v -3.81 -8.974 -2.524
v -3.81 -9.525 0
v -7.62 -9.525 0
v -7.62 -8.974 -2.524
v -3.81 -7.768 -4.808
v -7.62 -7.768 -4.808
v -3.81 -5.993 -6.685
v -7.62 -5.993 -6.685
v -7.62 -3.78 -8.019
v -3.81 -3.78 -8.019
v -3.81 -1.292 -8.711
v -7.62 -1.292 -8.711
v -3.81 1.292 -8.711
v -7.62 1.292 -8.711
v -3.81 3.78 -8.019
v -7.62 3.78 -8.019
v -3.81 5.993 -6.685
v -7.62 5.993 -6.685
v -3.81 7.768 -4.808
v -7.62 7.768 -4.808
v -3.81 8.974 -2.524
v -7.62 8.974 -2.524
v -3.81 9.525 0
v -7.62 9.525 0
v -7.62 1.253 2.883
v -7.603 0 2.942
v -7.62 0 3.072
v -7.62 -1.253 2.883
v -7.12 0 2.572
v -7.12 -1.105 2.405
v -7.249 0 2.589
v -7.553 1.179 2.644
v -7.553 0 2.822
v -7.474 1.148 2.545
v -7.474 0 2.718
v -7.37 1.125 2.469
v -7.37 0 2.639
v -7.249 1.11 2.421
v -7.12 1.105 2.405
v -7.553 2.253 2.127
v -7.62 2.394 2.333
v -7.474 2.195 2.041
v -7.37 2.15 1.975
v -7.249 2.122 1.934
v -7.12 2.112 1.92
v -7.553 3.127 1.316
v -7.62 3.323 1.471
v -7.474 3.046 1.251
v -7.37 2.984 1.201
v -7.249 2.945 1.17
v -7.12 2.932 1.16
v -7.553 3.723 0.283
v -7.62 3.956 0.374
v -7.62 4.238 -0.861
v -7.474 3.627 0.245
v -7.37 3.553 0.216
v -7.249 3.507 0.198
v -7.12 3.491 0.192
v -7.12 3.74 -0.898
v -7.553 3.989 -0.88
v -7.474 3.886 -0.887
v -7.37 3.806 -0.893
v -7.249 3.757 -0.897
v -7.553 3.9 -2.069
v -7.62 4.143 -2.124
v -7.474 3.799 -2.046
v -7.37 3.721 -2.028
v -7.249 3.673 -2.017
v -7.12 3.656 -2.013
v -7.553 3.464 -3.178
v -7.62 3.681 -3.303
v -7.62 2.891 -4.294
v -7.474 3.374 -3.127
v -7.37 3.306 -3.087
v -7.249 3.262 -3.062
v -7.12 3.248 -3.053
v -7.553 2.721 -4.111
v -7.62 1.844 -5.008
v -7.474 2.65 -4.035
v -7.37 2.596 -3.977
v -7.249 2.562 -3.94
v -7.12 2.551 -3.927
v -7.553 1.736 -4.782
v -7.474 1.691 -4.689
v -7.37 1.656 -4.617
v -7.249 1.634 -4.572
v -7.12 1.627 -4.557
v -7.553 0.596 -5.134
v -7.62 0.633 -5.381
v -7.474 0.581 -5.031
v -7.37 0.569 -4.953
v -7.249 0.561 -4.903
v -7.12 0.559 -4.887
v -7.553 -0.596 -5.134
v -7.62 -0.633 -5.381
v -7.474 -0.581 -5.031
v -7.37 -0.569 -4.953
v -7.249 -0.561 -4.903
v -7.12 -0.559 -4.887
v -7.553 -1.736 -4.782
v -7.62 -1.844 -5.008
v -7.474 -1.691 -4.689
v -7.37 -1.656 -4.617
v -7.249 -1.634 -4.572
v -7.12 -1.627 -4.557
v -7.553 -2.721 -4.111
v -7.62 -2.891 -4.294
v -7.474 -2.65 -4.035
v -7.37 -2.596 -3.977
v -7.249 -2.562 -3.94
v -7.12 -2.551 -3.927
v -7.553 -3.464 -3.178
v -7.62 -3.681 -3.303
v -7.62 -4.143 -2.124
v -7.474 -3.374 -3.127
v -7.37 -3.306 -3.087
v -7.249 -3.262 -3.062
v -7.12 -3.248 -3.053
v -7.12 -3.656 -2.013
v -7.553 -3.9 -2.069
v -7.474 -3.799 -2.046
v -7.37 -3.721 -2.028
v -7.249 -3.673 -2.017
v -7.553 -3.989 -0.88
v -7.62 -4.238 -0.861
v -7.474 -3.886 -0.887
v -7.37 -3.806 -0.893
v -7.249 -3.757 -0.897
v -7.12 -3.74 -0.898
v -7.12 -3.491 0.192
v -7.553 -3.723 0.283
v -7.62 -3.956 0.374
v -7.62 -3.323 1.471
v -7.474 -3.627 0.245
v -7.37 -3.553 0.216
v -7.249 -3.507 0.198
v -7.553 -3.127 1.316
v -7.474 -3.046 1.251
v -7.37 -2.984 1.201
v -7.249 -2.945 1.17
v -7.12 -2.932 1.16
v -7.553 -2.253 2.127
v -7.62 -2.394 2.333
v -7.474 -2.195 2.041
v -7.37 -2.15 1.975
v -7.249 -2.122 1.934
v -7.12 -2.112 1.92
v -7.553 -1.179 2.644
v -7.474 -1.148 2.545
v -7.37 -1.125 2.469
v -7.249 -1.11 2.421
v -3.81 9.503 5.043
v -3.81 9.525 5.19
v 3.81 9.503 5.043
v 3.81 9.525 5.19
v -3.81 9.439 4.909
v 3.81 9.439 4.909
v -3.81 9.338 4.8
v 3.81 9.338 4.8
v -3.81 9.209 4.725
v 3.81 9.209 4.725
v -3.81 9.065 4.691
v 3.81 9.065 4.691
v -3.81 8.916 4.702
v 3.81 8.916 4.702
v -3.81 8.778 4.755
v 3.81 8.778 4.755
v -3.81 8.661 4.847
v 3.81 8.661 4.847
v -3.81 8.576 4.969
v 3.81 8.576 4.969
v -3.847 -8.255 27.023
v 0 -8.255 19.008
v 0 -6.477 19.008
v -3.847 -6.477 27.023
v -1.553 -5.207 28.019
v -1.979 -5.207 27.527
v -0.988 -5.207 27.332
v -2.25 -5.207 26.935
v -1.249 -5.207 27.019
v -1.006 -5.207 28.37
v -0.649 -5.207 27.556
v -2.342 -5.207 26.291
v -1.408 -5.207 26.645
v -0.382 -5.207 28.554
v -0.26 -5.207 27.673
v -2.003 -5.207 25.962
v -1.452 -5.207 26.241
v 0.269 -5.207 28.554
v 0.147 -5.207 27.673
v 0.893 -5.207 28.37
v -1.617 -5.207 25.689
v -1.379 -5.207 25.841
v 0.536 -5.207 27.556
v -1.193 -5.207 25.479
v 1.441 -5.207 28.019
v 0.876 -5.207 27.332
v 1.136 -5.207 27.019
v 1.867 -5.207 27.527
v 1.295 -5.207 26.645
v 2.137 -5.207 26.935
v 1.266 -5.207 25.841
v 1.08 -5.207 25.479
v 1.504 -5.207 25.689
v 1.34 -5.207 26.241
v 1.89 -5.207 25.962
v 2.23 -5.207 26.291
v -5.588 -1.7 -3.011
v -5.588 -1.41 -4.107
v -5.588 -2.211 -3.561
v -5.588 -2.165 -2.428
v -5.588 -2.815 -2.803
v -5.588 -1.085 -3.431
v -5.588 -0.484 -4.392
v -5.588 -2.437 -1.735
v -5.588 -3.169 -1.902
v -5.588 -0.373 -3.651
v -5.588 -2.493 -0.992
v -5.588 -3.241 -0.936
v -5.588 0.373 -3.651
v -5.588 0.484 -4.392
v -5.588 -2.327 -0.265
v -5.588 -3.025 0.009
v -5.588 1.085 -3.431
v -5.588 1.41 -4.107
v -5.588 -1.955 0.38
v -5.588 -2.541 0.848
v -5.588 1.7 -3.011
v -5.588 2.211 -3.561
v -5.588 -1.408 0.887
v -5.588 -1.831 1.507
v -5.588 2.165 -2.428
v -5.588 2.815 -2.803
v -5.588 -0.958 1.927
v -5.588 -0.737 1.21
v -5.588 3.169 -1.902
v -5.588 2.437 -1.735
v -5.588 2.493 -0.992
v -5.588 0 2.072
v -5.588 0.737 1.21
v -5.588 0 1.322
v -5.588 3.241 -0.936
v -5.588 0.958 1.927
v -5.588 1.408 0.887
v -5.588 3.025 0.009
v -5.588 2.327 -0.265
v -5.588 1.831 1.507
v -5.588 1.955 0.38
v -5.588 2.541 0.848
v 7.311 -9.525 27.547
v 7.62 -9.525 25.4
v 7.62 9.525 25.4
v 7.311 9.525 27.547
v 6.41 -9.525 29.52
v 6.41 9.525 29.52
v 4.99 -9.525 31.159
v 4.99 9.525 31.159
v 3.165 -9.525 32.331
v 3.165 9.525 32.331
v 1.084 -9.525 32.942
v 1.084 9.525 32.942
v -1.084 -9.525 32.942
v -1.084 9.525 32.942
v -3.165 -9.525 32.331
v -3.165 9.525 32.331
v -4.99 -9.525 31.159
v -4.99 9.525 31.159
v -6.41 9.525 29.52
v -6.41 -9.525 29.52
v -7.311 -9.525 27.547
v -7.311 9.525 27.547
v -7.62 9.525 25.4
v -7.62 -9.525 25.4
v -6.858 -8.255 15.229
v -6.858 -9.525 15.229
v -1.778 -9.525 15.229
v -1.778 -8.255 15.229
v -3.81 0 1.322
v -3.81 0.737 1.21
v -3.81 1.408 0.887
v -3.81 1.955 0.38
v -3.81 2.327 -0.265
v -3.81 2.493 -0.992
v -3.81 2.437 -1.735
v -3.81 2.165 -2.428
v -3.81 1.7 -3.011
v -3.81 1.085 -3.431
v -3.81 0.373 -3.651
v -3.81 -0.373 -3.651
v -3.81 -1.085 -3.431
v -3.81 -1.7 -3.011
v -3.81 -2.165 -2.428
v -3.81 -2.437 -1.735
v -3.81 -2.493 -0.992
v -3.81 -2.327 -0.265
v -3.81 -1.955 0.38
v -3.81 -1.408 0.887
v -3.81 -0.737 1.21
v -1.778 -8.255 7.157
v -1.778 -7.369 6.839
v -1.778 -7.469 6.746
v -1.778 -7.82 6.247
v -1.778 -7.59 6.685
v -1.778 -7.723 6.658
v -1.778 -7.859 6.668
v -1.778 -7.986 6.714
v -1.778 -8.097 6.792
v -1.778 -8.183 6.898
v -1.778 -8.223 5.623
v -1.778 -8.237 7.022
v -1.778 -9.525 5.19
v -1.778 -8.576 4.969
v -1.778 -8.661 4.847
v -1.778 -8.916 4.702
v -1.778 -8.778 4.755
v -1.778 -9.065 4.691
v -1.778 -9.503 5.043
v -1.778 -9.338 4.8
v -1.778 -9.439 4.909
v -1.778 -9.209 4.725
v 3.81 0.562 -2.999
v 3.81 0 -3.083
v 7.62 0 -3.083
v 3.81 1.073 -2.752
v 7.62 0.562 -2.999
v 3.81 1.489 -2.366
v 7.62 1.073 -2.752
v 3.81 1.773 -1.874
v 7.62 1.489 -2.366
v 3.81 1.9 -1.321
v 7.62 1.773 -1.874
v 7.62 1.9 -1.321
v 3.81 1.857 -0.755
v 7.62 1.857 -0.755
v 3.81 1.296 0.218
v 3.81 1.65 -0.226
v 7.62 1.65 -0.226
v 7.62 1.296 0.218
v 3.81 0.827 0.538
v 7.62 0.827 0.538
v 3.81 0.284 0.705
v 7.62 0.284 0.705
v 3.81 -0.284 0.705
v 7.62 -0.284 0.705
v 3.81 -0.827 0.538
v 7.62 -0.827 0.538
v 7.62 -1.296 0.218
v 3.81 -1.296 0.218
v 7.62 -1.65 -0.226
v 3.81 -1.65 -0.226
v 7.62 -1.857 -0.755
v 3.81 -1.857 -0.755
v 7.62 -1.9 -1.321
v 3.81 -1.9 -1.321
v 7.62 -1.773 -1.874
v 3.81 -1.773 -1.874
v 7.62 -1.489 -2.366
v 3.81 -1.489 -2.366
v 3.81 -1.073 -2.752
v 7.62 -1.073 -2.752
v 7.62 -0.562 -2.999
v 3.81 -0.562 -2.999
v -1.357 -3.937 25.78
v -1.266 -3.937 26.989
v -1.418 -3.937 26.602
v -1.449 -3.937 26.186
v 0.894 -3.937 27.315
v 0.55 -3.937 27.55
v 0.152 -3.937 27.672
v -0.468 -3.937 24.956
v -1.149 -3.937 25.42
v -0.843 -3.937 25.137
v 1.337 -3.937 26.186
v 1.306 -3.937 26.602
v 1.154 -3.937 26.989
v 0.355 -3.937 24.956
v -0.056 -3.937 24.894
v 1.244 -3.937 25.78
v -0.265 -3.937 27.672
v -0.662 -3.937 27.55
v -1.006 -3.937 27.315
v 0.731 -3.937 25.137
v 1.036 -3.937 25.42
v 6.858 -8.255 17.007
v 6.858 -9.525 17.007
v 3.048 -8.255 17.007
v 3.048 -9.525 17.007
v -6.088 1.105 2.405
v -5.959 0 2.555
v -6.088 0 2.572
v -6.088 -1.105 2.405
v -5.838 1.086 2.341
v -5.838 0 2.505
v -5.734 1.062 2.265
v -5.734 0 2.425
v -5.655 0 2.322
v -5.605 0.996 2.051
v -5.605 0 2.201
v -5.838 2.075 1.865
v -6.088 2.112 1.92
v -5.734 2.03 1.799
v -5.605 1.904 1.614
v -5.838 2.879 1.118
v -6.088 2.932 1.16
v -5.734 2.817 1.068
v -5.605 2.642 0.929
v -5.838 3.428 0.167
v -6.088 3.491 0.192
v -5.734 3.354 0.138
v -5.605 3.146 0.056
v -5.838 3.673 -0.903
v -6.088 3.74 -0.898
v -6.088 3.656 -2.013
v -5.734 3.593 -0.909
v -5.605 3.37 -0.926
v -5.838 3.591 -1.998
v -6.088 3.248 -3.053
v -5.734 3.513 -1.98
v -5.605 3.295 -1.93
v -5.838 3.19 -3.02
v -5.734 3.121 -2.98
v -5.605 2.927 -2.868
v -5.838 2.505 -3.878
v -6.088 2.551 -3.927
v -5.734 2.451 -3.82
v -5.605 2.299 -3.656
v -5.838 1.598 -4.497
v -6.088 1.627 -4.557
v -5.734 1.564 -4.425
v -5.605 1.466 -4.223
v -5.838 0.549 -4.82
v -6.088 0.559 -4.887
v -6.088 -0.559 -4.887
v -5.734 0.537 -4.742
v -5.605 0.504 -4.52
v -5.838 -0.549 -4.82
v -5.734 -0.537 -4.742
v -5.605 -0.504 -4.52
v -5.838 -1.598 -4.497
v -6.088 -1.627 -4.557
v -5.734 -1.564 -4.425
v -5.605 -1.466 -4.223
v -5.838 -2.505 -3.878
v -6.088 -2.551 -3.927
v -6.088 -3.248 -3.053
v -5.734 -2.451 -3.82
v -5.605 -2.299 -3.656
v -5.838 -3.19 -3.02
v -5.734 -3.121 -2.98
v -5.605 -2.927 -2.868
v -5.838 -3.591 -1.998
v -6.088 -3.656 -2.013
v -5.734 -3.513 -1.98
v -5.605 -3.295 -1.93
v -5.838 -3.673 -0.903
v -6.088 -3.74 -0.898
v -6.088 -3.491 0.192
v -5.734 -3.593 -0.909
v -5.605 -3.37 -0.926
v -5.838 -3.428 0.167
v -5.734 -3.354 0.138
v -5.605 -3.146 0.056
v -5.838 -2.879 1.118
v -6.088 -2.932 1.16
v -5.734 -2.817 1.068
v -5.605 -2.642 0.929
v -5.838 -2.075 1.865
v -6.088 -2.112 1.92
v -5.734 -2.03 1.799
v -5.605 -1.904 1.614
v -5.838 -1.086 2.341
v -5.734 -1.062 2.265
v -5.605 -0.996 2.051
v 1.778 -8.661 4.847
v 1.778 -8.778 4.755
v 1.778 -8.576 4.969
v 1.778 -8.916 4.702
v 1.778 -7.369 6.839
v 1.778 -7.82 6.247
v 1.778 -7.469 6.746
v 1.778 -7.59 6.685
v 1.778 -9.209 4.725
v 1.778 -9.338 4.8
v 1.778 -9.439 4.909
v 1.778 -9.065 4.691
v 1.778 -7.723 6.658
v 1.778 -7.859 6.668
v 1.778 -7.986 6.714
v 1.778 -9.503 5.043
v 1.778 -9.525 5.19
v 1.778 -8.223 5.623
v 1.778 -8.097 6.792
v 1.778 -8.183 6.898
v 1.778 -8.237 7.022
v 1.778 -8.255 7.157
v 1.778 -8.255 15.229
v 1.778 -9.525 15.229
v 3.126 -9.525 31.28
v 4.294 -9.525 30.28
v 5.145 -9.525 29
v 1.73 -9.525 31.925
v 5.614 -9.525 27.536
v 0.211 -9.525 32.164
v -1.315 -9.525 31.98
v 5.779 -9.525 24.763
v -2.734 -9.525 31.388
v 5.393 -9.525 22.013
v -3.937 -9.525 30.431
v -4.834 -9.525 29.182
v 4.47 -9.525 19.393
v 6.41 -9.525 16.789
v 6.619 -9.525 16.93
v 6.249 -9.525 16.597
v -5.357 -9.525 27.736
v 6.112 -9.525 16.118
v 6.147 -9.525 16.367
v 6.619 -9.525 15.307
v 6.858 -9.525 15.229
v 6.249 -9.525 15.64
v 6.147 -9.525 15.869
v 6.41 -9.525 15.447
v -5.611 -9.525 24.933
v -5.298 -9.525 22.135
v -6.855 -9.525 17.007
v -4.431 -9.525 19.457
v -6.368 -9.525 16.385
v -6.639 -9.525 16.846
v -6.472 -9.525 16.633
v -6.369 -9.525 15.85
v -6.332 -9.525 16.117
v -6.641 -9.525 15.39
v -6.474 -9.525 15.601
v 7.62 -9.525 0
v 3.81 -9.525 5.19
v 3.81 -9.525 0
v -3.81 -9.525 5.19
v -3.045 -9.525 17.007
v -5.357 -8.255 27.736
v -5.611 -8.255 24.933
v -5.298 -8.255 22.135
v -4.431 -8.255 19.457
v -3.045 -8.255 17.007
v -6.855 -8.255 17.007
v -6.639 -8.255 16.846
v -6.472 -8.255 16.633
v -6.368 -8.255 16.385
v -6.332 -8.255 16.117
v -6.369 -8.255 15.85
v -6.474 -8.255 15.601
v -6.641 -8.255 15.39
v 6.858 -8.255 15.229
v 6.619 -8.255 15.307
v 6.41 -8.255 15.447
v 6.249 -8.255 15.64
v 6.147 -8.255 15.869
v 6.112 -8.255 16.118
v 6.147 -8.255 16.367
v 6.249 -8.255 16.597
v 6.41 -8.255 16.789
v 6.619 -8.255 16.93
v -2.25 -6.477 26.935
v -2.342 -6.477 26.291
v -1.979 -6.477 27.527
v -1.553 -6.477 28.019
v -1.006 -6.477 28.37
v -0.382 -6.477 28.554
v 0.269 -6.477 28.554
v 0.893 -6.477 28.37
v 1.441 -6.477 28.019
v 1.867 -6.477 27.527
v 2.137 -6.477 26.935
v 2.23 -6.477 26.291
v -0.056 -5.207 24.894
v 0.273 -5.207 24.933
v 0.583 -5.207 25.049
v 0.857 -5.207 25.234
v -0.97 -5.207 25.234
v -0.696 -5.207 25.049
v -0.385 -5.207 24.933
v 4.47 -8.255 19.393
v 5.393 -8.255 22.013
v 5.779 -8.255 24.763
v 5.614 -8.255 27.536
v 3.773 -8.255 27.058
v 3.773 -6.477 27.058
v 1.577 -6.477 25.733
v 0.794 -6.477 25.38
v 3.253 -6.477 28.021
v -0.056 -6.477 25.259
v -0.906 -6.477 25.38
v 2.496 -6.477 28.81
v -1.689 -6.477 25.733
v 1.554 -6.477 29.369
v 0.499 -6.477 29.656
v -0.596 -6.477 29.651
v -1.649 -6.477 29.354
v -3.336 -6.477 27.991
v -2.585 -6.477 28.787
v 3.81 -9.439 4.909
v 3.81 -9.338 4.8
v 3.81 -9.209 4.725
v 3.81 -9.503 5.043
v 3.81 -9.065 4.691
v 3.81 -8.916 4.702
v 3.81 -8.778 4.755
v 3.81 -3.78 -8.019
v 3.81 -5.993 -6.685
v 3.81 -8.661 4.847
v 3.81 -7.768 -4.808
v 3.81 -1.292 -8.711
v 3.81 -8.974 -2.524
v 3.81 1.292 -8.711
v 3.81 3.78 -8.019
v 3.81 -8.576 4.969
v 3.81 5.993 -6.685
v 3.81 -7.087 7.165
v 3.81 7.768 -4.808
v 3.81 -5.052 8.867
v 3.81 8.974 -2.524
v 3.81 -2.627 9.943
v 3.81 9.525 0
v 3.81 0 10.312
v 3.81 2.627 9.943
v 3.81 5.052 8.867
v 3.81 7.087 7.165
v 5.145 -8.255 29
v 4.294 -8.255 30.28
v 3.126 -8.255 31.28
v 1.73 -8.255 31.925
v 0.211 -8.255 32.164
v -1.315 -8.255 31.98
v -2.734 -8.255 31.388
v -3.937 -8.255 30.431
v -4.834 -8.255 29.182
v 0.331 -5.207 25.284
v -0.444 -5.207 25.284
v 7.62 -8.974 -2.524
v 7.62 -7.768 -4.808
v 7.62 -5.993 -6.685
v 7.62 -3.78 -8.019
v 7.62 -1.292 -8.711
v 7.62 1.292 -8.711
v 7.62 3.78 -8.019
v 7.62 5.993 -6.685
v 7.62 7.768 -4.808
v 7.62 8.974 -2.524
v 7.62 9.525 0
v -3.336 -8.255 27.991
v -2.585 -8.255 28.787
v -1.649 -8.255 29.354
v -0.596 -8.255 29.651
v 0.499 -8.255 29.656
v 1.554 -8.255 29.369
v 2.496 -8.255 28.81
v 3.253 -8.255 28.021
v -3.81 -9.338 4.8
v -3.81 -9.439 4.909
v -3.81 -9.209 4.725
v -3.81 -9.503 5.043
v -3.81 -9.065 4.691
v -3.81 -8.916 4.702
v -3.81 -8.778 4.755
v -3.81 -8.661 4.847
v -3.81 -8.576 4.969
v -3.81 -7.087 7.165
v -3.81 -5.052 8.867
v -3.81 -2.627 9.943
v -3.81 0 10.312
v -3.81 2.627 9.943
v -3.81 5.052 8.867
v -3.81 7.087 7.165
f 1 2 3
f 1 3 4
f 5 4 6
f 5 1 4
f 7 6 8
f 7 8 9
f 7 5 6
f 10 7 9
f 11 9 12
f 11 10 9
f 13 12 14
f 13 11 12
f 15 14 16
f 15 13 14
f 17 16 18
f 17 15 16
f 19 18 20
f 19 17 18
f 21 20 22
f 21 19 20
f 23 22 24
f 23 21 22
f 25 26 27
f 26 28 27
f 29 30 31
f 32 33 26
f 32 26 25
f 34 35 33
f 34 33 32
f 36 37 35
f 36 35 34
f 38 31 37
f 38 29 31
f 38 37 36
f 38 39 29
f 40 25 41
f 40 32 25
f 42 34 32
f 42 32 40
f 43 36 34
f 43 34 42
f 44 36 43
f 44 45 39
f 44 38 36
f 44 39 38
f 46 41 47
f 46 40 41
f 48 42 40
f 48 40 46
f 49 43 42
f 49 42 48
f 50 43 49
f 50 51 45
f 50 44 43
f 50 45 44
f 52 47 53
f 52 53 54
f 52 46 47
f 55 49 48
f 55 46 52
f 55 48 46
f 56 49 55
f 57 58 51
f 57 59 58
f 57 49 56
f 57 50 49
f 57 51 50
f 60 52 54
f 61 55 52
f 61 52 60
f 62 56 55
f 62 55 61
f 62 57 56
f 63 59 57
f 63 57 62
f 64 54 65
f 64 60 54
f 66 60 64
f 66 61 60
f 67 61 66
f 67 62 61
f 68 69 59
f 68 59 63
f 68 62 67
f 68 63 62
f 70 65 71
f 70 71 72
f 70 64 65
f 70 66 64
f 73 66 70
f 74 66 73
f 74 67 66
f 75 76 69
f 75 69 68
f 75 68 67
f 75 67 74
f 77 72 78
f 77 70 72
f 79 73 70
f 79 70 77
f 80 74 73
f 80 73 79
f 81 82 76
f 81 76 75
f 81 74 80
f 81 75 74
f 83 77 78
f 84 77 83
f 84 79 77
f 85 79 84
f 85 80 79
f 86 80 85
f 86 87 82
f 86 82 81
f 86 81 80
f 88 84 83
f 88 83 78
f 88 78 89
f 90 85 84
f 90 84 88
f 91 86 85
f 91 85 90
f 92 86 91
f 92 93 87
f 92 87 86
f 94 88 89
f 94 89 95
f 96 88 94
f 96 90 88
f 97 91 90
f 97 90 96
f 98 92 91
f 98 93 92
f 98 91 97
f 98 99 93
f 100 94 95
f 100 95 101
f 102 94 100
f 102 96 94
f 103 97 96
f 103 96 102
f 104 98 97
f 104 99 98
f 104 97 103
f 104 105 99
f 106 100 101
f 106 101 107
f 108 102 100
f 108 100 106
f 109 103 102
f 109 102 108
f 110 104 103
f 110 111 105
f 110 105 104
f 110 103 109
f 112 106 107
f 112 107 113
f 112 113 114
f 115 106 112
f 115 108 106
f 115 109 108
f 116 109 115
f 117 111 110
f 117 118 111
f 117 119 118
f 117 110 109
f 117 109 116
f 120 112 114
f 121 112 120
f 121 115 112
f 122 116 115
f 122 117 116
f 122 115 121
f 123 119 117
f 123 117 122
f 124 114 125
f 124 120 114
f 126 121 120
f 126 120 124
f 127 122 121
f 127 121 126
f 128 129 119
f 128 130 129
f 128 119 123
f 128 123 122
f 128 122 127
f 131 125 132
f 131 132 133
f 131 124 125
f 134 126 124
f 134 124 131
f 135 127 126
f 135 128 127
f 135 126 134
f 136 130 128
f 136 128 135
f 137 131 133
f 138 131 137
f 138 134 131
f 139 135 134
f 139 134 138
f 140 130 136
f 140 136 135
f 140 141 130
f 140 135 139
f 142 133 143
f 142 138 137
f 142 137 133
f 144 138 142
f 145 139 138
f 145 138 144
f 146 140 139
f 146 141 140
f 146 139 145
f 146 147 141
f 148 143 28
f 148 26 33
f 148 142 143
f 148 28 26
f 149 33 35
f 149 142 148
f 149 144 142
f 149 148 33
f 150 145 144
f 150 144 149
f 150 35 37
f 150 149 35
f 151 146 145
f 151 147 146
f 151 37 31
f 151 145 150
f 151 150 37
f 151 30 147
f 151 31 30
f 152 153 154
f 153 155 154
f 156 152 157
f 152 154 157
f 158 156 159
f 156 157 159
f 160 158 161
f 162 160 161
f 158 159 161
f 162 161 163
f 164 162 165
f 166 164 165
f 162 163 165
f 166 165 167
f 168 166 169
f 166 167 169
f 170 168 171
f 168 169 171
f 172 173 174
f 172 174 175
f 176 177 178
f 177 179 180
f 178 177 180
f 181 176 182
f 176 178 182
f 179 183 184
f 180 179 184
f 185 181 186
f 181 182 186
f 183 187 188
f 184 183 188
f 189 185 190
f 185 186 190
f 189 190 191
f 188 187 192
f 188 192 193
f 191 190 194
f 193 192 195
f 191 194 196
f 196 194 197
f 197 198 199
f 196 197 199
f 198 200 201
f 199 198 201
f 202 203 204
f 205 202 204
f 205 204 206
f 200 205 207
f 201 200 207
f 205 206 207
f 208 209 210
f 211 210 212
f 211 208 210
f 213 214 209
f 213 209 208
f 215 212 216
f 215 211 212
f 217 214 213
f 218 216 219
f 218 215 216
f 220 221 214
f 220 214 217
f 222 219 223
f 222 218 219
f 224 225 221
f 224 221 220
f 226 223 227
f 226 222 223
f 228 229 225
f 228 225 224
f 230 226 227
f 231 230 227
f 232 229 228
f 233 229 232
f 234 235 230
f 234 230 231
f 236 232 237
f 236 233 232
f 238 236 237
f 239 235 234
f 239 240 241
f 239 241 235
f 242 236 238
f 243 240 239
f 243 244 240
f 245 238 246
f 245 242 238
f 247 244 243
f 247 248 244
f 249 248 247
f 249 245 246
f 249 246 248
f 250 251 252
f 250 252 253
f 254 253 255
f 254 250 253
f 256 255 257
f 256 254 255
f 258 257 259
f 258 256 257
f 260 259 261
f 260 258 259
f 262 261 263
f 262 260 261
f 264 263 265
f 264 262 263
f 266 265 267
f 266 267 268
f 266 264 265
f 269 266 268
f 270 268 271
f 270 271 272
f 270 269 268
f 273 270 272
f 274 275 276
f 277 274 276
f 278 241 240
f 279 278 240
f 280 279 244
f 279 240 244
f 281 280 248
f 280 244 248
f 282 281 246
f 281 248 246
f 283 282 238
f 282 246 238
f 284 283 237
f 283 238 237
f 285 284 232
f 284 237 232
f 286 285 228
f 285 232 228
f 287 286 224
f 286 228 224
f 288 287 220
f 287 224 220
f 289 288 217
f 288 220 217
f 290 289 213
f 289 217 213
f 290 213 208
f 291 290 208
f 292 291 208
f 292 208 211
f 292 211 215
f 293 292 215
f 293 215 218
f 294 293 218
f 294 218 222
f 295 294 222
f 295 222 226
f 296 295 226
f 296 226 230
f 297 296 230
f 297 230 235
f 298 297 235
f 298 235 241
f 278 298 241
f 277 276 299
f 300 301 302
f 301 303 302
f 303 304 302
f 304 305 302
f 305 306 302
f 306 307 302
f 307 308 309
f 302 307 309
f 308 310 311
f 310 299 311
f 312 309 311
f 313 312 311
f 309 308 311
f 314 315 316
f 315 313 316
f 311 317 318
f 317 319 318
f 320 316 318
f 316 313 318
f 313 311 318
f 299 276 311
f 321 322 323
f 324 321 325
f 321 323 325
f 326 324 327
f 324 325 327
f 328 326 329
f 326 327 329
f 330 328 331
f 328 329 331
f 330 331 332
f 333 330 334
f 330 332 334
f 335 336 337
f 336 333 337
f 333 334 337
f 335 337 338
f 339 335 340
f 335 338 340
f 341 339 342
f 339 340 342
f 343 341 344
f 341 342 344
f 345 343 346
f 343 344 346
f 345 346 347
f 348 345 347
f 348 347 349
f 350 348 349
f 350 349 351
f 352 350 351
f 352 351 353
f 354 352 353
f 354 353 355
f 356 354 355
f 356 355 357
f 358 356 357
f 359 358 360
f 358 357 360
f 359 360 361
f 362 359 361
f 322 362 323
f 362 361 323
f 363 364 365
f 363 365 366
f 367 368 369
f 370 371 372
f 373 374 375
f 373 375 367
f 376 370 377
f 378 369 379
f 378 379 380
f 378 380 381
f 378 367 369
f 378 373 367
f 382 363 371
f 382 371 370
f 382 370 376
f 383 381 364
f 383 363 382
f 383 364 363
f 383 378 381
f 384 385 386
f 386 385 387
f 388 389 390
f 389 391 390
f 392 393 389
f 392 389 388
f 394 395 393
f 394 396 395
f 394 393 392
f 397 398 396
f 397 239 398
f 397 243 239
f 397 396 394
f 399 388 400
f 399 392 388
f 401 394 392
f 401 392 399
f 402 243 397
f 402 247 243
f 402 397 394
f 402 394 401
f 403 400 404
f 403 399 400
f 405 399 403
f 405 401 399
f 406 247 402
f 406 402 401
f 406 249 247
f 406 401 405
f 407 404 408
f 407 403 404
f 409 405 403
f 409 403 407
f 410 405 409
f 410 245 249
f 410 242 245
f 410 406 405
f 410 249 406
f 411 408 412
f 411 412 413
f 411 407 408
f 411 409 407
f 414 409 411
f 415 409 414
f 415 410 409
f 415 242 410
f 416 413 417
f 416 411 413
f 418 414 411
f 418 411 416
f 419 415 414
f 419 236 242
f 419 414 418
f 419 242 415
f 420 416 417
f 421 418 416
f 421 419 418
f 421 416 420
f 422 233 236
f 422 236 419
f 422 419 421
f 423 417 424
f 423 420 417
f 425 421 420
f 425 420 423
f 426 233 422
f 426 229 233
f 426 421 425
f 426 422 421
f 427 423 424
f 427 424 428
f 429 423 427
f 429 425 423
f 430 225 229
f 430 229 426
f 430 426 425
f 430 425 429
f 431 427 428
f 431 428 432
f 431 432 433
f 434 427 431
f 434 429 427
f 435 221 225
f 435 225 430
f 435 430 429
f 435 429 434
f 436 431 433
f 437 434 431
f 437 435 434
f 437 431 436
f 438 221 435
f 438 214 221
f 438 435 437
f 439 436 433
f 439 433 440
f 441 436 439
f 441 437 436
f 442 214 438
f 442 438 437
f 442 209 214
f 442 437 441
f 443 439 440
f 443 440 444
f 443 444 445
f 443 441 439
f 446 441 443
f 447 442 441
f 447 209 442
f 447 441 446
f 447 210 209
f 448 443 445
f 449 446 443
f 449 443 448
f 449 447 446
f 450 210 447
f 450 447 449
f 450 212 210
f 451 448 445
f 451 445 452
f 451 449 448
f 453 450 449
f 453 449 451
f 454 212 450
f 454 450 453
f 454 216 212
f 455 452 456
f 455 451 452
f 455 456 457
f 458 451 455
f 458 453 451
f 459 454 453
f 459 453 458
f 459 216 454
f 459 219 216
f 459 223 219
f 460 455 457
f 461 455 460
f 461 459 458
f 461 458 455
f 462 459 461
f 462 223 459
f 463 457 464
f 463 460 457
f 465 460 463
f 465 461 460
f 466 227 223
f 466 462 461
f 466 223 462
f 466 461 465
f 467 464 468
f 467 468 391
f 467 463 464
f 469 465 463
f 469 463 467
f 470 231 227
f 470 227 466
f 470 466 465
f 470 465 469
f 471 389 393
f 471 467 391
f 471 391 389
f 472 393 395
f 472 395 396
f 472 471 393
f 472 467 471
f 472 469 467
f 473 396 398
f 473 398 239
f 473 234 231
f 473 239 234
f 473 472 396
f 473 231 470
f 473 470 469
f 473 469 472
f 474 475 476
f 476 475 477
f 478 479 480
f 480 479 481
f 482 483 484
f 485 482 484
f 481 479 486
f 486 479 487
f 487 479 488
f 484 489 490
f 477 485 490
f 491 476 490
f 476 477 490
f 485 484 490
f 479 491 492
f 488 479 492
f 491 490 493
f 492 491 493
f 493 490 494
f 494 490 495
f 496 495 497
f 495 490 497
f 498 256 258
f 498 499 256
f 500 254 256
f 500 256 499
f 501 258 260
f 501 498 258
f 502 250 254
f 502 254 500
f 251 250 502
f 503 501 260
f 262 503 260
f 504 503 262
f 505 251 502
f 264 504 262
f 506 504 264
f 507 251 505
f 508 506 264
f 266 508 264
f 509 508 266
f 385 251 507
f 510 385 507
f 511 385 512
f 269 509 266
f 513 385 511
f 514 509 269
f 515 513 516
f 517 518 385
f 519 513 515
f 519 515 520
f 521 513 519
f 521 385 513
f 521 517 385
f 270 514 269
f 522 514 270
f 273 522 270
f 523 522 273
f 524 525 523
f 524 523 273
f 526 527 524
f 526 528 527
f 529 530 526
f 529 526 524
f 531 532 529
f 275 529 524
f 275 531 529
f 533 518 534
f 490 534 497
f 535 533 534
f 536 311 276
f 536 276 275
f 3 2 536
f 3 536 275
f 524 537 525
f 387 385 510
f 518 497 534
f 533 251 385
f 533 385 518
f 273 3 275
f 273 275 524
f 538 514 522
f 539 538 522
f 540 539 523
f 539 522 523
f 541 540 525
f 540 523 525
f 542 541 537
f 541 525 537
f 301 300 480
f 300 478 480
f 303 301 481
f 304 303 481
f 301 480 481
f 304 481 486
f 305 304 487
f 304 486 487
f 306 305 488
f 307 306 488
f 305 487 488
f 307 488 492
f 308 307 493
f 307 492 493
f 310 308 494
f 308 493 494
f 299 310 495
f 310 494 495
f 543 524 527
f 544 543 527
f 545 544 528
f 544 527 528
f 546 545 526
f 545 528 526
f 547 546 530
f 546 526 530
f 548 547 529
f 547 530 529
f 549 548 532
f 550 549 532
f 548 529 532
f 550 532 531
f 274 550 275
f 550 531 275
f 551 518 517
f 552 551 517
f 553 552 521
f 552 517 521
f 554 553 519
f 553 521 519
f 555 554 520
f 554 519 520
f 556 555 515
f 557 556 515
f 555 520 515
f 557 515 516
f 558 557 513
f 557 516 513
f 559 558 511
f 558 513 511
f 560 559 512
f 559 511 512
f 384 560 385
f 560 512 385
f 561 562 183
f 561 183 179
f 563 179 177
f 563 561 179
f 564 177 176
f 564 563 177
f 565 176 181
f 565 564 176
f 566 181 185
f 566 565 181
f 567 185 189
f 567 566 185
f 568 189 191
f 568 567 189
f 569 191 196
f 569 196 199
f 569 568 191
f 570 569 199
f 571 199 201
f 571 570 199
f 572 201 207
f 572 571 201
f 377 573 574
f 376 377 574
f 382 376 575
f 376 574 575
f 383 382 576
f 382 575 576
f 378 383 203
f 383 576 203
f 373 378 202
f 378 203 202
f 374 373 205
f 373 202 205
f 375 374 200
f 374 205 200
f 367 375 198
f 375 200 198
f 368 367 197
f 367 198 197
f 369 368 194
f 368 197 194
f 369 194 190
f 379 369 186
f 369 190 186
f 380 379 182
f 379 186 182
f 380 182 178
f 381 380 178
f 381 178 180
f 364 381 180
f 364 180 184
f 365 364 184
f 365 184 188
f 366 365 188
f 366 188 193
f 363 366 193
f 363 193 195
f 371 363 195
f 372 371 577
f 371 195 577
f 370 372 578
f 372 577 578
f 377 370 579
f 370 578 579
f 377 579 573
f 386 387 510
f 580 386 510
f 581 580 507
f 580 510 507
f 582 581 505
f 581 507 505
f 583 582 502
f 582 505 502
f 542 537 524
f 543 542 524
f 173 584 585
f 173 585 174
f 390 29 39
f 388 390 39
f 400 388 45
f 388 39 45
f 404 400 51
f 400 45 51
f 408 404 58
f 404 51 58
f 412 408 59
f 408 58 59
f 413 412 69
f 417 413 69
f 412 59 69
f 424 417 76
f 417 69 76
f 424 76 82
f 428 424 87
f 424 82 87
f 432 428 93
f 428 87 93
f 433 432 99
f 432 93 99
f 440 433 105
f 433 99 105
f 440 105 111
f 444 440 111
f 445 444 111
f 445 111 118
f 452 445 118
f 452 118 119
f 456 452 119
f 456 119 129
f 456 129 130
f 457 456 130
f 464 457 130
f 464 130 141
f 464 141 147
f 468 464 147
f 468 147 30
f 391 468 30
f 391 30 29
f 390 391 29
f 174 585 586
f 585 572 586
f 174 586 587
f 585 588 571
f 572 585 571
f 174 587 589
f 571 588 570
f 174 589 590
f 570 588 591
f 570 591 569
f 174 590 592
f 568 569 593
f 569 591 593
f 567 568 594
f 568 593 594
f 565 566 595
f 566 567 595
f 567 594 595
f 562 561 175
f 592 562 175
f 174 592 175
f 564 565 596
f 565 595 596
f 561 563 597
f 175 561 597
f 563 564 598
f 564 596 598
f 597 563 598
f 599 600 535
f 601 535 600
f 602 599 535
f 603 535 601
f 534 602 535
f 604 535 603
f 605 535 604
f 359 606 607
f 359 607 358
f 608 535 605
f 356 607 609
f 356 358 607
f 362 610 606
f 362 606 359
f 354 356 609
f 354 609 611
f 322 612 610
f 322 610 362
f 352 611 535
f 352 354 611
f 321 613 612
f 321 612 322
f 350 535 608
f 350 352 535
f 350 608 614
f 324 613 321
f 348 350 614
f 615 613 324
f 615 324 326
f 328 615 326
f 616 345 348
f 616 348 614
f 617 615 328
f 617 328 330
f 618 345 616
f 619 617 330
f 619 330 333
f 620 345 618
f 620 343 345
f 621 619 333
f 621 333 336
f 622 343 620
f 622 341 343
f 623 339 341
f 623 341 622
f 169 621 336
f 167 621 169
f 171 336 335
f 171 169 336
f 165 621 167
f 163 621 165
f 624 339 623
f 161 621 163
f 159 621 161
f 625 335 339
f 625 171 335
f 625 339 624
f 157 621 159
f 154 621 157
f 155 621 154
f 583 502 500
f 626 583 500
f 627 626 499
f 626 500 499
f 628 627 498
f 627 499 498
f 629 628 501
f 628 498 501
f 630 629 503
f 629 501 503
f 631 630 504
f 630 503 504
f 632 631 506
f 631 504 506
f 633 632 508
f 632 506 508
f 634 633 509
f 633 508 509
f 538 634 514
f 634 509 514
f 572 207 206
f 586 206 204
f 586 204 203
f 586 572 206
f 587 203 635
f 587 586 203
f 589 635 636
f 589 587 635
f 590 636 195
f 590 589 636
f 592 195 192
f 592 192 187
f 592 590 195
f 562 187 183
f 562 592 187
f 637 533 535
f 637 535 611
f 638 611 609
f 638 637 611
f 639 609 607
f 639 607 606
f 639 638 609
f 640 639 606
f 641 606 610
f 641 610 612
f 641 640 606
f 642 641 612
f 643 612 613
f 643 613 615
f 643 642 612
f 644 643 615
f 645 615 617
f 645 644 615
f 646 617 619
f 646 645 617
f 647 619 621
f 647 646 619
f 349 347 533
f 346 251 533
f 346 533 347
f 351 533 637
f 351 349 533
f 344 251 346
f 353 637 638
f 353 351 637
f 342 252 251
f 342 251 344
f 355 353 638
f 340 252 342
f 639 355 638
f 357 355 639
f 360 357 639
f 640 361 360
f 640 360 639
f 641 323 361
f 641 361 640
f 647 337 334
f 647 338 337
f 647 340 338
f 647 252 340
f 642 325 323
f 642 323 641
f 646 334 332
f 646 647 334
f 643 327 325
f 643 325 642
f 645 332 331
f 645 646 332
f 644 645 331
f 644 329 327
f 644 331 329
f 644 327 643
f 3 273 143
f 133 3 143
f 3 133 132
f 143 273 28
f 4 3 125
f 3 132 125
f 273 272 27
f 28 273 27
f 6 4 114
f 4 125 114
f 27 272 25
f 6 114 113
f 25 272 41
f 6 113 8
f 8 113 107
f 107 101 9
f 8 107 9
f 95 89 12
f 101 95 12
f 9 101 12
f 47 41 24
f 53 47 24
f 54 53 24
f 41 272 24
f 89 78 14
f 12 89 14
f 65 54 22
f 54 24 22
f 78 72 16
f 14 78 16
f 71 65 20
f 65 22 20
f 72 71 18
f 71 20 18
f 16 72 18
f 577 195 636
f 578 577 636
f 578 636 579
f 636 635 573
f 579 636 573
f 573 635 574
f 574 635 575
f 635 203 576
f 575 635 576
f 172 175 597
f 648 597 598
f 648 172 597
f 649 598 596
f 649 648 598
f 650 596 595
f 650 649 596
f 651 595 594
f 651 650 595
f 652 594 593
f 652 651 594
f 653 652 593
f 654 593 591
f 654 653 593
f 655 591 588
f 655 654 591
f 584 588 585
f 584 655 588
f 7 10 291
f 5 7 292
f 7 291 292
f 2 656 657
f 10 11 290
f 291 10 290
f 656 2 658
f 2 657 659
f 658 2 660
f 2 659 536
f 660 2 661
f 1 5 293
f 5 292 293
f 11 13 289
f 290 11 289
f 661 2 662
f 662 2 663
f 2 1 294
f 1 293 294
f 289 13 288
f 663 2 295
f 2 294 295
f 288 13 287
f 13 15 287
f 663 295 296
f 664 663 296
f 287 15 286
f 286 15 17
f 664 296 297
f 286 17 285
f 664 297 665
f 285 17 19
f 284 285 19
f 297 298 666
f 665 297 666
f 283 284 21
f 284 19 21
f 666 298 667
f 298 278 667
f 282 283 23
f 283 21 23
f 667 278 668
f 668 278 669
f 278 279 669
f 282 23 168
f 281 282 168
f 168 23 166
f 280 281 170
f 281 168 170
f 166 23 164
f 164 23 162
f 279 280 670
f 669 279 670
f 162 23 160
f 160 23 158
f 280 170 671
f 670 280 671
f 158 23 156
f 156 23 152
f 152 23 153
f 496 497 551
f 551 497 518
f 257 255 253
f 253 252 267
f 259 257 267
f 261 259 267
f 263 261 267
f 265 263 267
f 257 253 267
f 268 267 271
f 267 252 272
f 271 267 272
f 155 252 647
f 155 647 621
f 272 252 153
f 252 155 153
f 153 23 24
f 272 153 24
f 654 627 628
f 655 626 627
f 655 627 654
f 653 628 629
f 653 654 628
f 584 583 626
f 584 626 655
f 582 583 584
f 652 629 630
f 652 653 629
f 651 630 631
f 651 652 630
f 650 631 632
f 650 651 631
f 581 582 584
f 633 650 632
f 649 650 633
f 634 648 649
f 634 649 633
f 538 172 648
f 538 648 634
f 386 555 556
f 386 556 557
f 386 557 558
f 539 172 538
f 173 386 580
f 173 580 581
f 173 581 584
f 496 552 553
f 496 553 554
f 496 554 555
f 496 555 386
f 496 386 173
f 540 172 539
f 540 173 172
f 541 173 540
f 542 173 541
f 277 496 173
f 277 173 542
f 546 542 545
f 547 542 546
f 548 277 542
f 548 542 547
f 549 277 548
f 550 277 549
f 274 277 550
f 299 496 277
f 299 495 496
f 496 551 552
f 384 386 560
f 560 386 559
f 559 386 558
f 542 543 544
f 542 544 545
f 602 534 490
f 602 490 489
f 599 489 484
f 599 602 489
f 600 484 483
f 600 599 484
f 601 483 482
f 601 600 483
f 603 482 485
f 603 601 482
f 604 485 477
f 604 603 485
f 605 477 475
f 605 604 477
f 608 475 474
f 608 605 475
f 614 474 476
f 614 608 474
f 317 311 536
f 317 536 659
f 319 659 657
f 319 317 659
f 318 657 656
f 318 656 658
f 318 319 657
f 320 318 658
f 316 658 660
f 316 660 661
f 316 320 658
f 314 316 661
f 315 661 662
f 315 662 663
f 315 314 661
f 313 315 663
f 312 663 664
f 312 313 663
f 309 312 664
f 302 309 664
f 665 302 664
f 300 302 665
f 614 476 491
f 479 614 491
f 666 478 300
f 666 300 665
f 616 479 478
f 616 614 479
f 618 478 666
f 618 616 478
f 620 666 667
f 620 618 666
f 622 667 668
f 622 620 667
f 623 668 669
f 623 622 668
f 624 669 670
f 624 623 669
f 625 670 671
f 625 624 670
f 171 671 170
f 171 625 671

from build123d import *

# Parameters (mm, degrees)
SKETCH1_W                                       = 15.24
SKETCH1_H                                       = 19.05
BOSS_EXTRUDE1_DEPTH                             = 25.4
BOSS_EXTRUDE5_DEPTH                             = 3.81
LPATTERN2_COUNT                                 = 2
LPATTERN2_PITCH                                 = 11.43
SKETCH10_R                                      = 1.905
CUT_EXTRUDE1_DEPTH                              = 16.24
BOSS_EXTRUDE6_DEPTH                             = 19.05
CUT_EXTRUDE2_DEPTH                              = 3.81
CBORE_FOR_6_PAN_HEAD_MACHINE_SCREW1_D           = 3.7500052
CBORE_FOR_6_PAN_HEAD_MACHINE_SCREW1_CBORE_D     = 7.5000104
CBORE_FOR_6_PAN_HEAD_MACHINE_SCREW1_CBORE_DEPTH = 2.032
CUT_EXTRUDE3_REACH                              = 15.208
SKETCH22_R                                      = 2.499995
FILLET1_R                                       = 0.5
FILLET2_R                                       = 0.5
CUT_EXTRUDE4_DEPTH                              = 1.27
CUT_EXTRUDE6_DEPTH                              = 3.048
FILLET3_R                                       = 0.5
CUT_EXTRUDE7_DEPTH                              = 1.27
SKETCH27_R                                      = 1.397
CUT_EXTRUDE8_DEPTH                              = 1.27


with BuildPart() as part:
    # Sketch1 → Boss-Extrude1 (new body)
    with BuildSketch(Plane.XY):
        Rectangle(SKETCH1_W, SKETCH1_H)
    extrude(amount=BOSS_EXTRUDE1_DEPTH)

    # Sketch9 → Boss-Extrude5 (add)
    with BuildSketch(Plane(origin=(7.62, 0, 0), x_dir=(0, 0, -1), z_dir=(1, 0, 0))):
        with BuildLine():
            Line((0, 9.525), (0, -9.525))
            ThreePointArc((0, -9.525), (8.798459024, 0), (0, 9.525))
        make_face()
    boss_extrude5 = extrude(amount=-BOSS_EXTRUDE5_DEPTH)

    # LPattern2: Boss-Extrude5 ×2
    with Locations(*[(-i * LPATTERN2_PITCH, 0, 0) for i in range(1, LPATTERN2_COUNT)]):
        add(boss_extrude5)

    # Sketch10 → Cut-Extrude1 (cut, through all)
    with BuildSketch(Plane(origin=(7.62, 0, 0), x_dir=(0, 0, -1), z_dir=(1, 0, 0))):
        with Locations((1.178459024, 0)):
            Circle(SKETCH10_R)
    extrude(amount=-CUT_EXTRUDE1_DEPTH, mode=Mode.SUBTRACT)

    # Sketch13 → Boss-Extrude6 (add)
    with BuildSketch(Plane(origin=(0, -9.525, 0), x_dir=(-1, 0, 0), z_dir=(0, -1, 0))):
        with BuildLine():
            Line((7.62, -25.4), (-7.62, -25.4))
            ThreePointArc((-7.62, -25.4), (0, -33.02), (7.62, -25.4))
        make_face()
    extrude(amount=-BOSS_EXTRUDE6_DEPTH)

    # Sketch17 → Cut-Extrude2 (cut, symmetric)
    with BuildSketch(Plane(origin=(0, 0, 0), x_dir=(0, 0, -1), z_dir=(1, 0, 0))):
        with BuildLine():
            Line((0, 9.525), (0, -9.525))
            ThreePointArc((0, -9.525), (-10.311535776, 0), (0, 9.525))
        make_face()
    extrude(amount=CUT_EXTRUDE2_DEPTH, both=True, mode=Mode.SUBTRACT)

    # CBORE for #6 Pan Head Machine Screw1 (through all)
    with Locations(Plane.ZY.offset(7.62)):
        with Locations((-1.178459024, 0)):
            CounterBoreHole(CBORE_FOR_6_PAN_HEAD_MACHINE_SCREW1_D / 2, CBORE_FOR_6_PAN_HEAD_MACHINE_SCREW1_CBORE_D / 2, CBORE_FOR_6_PAN_HEAD_MACHINE_SCREW1_CBORE_DEPTH)

    # Sketch22 → Cut-Extrude3 (cut, up to next)
    with BuildSketch(Plane.ZY.offset(5.588), mode=Mode.PRIVATE) as cut_extrude3_sk1:
        with Locations((-1.178459024, 0)):
            Circle(SKETCH22_R)
    cut_extrude3_tool1 = extrude(cut_extrude3_sk1.sketch, amount=-CUT_EXTRUDE3_REACH, mode=Mode.PRIVATE) & part.part
    add(cut_extrude3_tool1.solids().sort_by_distance((-5.588, 0, -1.178459))[0], mode=Mode.SUBTRACT)

    # Fillet1
    fillet1_edges = [part.edges().sort_by_distance(p)[0] for p in [
        (0, 9.525, 1.513076752),
        (0, -9.525, 1.513076752),
    ]]
    fillet(fillet1_edges, radius=FILLET1_R)

    # Fillet2
    fillet2_edges = [part.edges().sort_by_distance(p)[0] for p in [
        (-7.62, 0, -4.928464224),
        (-5.588, 0, -4.928464224),
    ]]
    fillet(fillet2_edges, radius=FILLET2_R)

    # Sketch18 → Cut-Extrude4 (cut)
    with BuildSketch(Plane(origin=(0, -9.525, 0), x_dir=(-1, 0, 0), z_dir=(0, -1, 0))):
        with BuildLine():
            Line((3.044880057, -17.007076752), (6.854880057, -17.007076752))
            ThreePointArc((6.854880057, -17.007076752), (6.332307247, -16.11715703), (6.858, -15.229076752))
            Line((6.858, -15.229076752), (1.778, -15.229076752))
            Line((1.778, -15.229076752), (1.778, -1.513076752))
            ThreePointArc((1.778, -1.513076752), (0, -3.291076752), (-1.778, -1.513076752))
            Line((-1.778, -1.513076752), (-1.778, -15.229076752))
            Line((-1.778, -15.229076752), (-6.858, -15.229076752))
            ThreePointArc((-6.858, -15.229076752), (-6.111619184, -16.118076752), (-6.858, -17.007076752))
            Line((-6.858, -17.007076752), (-3.048, -17.007076752))
            ThreePointArc((-3.048, -17.007076752), (-5.392804187, -22.012637101), (-5.614223517, -27.535744431))
            ThreePointArc((-5.614223517, -27.535744431), (-0.211295876, -32.163939746), (5.357263796, -27.736416493))
            ThreePointArc((5.357263796, -27.736416493), (5.298057191, -22.135324722), (3.044880057, -17.007076752))
        make_face()
    extrude(amount=-CUT_EXTRUDE4_DEPTH, mode=Mode.SUBTRACT)

    # Sketch23 → Cut-Extrude6 (cut)
    with BuildSketch(Plane.XZ.offset(9.525)):
        with BuildLine():
            Line((0, 19.008349223), (-3.846708267, 27.023019242))
            ThreePointArc((-3.846708267, 27.023019242), (-0.048818705, 29.690299102), (3.773291733, 27.057844207))
            Line((3.773291733, 27.057844207), (0, 19.008349223))
        make_face()
    extrude(amount=-CUT_EXTRUDE6_DEPTH, mode=Mode.SUBTRACT)

    # Fillet3
    fillet3_edges = [part.edges().sort_by_distance(p)[0] for p in [
        (0, -8.255, 5.568289649),
    ]]
    fillet(fillet3_edges, radius=FILLET3_R)

    # Sketch26 → Cut-Extrude7 (cut)
    with BuildSketch(Plane(origin=(0, -6.477, 0), x_dir=(-1, 0, 0), z_dir=(0, -1, 0))):
        with BuildLine():
            ThreePointArc((2.342289249, -26.290868459), (0.056289249, -28.576868459), (-2.229710751, -26.290868459))
            ThreePointArc((-2.229710751, -26.290868459), (0.056289249, -25.258930958), (2.342289249, -26.290868459))
        make_face()
    extrude(amount=-CUT_EXTRUDE7_DEPTH, mode=Mode.SUBTRACT)

    # Sketch27 → Cut-Extrude8 (cut)
    with BuildSketch(Plane.XZ.offset(5.207)):
        with Locations(Location((-0.056289249, 26.290868459, 0), (0, 0, 270))):  # turned: the seam where the file's is
            Circle(SKETCH27_R)
    extrude(amount=-CUT_EXTRUDE8_DEPTH, mode=Mode.SUBTRACT)


solid = part.part
